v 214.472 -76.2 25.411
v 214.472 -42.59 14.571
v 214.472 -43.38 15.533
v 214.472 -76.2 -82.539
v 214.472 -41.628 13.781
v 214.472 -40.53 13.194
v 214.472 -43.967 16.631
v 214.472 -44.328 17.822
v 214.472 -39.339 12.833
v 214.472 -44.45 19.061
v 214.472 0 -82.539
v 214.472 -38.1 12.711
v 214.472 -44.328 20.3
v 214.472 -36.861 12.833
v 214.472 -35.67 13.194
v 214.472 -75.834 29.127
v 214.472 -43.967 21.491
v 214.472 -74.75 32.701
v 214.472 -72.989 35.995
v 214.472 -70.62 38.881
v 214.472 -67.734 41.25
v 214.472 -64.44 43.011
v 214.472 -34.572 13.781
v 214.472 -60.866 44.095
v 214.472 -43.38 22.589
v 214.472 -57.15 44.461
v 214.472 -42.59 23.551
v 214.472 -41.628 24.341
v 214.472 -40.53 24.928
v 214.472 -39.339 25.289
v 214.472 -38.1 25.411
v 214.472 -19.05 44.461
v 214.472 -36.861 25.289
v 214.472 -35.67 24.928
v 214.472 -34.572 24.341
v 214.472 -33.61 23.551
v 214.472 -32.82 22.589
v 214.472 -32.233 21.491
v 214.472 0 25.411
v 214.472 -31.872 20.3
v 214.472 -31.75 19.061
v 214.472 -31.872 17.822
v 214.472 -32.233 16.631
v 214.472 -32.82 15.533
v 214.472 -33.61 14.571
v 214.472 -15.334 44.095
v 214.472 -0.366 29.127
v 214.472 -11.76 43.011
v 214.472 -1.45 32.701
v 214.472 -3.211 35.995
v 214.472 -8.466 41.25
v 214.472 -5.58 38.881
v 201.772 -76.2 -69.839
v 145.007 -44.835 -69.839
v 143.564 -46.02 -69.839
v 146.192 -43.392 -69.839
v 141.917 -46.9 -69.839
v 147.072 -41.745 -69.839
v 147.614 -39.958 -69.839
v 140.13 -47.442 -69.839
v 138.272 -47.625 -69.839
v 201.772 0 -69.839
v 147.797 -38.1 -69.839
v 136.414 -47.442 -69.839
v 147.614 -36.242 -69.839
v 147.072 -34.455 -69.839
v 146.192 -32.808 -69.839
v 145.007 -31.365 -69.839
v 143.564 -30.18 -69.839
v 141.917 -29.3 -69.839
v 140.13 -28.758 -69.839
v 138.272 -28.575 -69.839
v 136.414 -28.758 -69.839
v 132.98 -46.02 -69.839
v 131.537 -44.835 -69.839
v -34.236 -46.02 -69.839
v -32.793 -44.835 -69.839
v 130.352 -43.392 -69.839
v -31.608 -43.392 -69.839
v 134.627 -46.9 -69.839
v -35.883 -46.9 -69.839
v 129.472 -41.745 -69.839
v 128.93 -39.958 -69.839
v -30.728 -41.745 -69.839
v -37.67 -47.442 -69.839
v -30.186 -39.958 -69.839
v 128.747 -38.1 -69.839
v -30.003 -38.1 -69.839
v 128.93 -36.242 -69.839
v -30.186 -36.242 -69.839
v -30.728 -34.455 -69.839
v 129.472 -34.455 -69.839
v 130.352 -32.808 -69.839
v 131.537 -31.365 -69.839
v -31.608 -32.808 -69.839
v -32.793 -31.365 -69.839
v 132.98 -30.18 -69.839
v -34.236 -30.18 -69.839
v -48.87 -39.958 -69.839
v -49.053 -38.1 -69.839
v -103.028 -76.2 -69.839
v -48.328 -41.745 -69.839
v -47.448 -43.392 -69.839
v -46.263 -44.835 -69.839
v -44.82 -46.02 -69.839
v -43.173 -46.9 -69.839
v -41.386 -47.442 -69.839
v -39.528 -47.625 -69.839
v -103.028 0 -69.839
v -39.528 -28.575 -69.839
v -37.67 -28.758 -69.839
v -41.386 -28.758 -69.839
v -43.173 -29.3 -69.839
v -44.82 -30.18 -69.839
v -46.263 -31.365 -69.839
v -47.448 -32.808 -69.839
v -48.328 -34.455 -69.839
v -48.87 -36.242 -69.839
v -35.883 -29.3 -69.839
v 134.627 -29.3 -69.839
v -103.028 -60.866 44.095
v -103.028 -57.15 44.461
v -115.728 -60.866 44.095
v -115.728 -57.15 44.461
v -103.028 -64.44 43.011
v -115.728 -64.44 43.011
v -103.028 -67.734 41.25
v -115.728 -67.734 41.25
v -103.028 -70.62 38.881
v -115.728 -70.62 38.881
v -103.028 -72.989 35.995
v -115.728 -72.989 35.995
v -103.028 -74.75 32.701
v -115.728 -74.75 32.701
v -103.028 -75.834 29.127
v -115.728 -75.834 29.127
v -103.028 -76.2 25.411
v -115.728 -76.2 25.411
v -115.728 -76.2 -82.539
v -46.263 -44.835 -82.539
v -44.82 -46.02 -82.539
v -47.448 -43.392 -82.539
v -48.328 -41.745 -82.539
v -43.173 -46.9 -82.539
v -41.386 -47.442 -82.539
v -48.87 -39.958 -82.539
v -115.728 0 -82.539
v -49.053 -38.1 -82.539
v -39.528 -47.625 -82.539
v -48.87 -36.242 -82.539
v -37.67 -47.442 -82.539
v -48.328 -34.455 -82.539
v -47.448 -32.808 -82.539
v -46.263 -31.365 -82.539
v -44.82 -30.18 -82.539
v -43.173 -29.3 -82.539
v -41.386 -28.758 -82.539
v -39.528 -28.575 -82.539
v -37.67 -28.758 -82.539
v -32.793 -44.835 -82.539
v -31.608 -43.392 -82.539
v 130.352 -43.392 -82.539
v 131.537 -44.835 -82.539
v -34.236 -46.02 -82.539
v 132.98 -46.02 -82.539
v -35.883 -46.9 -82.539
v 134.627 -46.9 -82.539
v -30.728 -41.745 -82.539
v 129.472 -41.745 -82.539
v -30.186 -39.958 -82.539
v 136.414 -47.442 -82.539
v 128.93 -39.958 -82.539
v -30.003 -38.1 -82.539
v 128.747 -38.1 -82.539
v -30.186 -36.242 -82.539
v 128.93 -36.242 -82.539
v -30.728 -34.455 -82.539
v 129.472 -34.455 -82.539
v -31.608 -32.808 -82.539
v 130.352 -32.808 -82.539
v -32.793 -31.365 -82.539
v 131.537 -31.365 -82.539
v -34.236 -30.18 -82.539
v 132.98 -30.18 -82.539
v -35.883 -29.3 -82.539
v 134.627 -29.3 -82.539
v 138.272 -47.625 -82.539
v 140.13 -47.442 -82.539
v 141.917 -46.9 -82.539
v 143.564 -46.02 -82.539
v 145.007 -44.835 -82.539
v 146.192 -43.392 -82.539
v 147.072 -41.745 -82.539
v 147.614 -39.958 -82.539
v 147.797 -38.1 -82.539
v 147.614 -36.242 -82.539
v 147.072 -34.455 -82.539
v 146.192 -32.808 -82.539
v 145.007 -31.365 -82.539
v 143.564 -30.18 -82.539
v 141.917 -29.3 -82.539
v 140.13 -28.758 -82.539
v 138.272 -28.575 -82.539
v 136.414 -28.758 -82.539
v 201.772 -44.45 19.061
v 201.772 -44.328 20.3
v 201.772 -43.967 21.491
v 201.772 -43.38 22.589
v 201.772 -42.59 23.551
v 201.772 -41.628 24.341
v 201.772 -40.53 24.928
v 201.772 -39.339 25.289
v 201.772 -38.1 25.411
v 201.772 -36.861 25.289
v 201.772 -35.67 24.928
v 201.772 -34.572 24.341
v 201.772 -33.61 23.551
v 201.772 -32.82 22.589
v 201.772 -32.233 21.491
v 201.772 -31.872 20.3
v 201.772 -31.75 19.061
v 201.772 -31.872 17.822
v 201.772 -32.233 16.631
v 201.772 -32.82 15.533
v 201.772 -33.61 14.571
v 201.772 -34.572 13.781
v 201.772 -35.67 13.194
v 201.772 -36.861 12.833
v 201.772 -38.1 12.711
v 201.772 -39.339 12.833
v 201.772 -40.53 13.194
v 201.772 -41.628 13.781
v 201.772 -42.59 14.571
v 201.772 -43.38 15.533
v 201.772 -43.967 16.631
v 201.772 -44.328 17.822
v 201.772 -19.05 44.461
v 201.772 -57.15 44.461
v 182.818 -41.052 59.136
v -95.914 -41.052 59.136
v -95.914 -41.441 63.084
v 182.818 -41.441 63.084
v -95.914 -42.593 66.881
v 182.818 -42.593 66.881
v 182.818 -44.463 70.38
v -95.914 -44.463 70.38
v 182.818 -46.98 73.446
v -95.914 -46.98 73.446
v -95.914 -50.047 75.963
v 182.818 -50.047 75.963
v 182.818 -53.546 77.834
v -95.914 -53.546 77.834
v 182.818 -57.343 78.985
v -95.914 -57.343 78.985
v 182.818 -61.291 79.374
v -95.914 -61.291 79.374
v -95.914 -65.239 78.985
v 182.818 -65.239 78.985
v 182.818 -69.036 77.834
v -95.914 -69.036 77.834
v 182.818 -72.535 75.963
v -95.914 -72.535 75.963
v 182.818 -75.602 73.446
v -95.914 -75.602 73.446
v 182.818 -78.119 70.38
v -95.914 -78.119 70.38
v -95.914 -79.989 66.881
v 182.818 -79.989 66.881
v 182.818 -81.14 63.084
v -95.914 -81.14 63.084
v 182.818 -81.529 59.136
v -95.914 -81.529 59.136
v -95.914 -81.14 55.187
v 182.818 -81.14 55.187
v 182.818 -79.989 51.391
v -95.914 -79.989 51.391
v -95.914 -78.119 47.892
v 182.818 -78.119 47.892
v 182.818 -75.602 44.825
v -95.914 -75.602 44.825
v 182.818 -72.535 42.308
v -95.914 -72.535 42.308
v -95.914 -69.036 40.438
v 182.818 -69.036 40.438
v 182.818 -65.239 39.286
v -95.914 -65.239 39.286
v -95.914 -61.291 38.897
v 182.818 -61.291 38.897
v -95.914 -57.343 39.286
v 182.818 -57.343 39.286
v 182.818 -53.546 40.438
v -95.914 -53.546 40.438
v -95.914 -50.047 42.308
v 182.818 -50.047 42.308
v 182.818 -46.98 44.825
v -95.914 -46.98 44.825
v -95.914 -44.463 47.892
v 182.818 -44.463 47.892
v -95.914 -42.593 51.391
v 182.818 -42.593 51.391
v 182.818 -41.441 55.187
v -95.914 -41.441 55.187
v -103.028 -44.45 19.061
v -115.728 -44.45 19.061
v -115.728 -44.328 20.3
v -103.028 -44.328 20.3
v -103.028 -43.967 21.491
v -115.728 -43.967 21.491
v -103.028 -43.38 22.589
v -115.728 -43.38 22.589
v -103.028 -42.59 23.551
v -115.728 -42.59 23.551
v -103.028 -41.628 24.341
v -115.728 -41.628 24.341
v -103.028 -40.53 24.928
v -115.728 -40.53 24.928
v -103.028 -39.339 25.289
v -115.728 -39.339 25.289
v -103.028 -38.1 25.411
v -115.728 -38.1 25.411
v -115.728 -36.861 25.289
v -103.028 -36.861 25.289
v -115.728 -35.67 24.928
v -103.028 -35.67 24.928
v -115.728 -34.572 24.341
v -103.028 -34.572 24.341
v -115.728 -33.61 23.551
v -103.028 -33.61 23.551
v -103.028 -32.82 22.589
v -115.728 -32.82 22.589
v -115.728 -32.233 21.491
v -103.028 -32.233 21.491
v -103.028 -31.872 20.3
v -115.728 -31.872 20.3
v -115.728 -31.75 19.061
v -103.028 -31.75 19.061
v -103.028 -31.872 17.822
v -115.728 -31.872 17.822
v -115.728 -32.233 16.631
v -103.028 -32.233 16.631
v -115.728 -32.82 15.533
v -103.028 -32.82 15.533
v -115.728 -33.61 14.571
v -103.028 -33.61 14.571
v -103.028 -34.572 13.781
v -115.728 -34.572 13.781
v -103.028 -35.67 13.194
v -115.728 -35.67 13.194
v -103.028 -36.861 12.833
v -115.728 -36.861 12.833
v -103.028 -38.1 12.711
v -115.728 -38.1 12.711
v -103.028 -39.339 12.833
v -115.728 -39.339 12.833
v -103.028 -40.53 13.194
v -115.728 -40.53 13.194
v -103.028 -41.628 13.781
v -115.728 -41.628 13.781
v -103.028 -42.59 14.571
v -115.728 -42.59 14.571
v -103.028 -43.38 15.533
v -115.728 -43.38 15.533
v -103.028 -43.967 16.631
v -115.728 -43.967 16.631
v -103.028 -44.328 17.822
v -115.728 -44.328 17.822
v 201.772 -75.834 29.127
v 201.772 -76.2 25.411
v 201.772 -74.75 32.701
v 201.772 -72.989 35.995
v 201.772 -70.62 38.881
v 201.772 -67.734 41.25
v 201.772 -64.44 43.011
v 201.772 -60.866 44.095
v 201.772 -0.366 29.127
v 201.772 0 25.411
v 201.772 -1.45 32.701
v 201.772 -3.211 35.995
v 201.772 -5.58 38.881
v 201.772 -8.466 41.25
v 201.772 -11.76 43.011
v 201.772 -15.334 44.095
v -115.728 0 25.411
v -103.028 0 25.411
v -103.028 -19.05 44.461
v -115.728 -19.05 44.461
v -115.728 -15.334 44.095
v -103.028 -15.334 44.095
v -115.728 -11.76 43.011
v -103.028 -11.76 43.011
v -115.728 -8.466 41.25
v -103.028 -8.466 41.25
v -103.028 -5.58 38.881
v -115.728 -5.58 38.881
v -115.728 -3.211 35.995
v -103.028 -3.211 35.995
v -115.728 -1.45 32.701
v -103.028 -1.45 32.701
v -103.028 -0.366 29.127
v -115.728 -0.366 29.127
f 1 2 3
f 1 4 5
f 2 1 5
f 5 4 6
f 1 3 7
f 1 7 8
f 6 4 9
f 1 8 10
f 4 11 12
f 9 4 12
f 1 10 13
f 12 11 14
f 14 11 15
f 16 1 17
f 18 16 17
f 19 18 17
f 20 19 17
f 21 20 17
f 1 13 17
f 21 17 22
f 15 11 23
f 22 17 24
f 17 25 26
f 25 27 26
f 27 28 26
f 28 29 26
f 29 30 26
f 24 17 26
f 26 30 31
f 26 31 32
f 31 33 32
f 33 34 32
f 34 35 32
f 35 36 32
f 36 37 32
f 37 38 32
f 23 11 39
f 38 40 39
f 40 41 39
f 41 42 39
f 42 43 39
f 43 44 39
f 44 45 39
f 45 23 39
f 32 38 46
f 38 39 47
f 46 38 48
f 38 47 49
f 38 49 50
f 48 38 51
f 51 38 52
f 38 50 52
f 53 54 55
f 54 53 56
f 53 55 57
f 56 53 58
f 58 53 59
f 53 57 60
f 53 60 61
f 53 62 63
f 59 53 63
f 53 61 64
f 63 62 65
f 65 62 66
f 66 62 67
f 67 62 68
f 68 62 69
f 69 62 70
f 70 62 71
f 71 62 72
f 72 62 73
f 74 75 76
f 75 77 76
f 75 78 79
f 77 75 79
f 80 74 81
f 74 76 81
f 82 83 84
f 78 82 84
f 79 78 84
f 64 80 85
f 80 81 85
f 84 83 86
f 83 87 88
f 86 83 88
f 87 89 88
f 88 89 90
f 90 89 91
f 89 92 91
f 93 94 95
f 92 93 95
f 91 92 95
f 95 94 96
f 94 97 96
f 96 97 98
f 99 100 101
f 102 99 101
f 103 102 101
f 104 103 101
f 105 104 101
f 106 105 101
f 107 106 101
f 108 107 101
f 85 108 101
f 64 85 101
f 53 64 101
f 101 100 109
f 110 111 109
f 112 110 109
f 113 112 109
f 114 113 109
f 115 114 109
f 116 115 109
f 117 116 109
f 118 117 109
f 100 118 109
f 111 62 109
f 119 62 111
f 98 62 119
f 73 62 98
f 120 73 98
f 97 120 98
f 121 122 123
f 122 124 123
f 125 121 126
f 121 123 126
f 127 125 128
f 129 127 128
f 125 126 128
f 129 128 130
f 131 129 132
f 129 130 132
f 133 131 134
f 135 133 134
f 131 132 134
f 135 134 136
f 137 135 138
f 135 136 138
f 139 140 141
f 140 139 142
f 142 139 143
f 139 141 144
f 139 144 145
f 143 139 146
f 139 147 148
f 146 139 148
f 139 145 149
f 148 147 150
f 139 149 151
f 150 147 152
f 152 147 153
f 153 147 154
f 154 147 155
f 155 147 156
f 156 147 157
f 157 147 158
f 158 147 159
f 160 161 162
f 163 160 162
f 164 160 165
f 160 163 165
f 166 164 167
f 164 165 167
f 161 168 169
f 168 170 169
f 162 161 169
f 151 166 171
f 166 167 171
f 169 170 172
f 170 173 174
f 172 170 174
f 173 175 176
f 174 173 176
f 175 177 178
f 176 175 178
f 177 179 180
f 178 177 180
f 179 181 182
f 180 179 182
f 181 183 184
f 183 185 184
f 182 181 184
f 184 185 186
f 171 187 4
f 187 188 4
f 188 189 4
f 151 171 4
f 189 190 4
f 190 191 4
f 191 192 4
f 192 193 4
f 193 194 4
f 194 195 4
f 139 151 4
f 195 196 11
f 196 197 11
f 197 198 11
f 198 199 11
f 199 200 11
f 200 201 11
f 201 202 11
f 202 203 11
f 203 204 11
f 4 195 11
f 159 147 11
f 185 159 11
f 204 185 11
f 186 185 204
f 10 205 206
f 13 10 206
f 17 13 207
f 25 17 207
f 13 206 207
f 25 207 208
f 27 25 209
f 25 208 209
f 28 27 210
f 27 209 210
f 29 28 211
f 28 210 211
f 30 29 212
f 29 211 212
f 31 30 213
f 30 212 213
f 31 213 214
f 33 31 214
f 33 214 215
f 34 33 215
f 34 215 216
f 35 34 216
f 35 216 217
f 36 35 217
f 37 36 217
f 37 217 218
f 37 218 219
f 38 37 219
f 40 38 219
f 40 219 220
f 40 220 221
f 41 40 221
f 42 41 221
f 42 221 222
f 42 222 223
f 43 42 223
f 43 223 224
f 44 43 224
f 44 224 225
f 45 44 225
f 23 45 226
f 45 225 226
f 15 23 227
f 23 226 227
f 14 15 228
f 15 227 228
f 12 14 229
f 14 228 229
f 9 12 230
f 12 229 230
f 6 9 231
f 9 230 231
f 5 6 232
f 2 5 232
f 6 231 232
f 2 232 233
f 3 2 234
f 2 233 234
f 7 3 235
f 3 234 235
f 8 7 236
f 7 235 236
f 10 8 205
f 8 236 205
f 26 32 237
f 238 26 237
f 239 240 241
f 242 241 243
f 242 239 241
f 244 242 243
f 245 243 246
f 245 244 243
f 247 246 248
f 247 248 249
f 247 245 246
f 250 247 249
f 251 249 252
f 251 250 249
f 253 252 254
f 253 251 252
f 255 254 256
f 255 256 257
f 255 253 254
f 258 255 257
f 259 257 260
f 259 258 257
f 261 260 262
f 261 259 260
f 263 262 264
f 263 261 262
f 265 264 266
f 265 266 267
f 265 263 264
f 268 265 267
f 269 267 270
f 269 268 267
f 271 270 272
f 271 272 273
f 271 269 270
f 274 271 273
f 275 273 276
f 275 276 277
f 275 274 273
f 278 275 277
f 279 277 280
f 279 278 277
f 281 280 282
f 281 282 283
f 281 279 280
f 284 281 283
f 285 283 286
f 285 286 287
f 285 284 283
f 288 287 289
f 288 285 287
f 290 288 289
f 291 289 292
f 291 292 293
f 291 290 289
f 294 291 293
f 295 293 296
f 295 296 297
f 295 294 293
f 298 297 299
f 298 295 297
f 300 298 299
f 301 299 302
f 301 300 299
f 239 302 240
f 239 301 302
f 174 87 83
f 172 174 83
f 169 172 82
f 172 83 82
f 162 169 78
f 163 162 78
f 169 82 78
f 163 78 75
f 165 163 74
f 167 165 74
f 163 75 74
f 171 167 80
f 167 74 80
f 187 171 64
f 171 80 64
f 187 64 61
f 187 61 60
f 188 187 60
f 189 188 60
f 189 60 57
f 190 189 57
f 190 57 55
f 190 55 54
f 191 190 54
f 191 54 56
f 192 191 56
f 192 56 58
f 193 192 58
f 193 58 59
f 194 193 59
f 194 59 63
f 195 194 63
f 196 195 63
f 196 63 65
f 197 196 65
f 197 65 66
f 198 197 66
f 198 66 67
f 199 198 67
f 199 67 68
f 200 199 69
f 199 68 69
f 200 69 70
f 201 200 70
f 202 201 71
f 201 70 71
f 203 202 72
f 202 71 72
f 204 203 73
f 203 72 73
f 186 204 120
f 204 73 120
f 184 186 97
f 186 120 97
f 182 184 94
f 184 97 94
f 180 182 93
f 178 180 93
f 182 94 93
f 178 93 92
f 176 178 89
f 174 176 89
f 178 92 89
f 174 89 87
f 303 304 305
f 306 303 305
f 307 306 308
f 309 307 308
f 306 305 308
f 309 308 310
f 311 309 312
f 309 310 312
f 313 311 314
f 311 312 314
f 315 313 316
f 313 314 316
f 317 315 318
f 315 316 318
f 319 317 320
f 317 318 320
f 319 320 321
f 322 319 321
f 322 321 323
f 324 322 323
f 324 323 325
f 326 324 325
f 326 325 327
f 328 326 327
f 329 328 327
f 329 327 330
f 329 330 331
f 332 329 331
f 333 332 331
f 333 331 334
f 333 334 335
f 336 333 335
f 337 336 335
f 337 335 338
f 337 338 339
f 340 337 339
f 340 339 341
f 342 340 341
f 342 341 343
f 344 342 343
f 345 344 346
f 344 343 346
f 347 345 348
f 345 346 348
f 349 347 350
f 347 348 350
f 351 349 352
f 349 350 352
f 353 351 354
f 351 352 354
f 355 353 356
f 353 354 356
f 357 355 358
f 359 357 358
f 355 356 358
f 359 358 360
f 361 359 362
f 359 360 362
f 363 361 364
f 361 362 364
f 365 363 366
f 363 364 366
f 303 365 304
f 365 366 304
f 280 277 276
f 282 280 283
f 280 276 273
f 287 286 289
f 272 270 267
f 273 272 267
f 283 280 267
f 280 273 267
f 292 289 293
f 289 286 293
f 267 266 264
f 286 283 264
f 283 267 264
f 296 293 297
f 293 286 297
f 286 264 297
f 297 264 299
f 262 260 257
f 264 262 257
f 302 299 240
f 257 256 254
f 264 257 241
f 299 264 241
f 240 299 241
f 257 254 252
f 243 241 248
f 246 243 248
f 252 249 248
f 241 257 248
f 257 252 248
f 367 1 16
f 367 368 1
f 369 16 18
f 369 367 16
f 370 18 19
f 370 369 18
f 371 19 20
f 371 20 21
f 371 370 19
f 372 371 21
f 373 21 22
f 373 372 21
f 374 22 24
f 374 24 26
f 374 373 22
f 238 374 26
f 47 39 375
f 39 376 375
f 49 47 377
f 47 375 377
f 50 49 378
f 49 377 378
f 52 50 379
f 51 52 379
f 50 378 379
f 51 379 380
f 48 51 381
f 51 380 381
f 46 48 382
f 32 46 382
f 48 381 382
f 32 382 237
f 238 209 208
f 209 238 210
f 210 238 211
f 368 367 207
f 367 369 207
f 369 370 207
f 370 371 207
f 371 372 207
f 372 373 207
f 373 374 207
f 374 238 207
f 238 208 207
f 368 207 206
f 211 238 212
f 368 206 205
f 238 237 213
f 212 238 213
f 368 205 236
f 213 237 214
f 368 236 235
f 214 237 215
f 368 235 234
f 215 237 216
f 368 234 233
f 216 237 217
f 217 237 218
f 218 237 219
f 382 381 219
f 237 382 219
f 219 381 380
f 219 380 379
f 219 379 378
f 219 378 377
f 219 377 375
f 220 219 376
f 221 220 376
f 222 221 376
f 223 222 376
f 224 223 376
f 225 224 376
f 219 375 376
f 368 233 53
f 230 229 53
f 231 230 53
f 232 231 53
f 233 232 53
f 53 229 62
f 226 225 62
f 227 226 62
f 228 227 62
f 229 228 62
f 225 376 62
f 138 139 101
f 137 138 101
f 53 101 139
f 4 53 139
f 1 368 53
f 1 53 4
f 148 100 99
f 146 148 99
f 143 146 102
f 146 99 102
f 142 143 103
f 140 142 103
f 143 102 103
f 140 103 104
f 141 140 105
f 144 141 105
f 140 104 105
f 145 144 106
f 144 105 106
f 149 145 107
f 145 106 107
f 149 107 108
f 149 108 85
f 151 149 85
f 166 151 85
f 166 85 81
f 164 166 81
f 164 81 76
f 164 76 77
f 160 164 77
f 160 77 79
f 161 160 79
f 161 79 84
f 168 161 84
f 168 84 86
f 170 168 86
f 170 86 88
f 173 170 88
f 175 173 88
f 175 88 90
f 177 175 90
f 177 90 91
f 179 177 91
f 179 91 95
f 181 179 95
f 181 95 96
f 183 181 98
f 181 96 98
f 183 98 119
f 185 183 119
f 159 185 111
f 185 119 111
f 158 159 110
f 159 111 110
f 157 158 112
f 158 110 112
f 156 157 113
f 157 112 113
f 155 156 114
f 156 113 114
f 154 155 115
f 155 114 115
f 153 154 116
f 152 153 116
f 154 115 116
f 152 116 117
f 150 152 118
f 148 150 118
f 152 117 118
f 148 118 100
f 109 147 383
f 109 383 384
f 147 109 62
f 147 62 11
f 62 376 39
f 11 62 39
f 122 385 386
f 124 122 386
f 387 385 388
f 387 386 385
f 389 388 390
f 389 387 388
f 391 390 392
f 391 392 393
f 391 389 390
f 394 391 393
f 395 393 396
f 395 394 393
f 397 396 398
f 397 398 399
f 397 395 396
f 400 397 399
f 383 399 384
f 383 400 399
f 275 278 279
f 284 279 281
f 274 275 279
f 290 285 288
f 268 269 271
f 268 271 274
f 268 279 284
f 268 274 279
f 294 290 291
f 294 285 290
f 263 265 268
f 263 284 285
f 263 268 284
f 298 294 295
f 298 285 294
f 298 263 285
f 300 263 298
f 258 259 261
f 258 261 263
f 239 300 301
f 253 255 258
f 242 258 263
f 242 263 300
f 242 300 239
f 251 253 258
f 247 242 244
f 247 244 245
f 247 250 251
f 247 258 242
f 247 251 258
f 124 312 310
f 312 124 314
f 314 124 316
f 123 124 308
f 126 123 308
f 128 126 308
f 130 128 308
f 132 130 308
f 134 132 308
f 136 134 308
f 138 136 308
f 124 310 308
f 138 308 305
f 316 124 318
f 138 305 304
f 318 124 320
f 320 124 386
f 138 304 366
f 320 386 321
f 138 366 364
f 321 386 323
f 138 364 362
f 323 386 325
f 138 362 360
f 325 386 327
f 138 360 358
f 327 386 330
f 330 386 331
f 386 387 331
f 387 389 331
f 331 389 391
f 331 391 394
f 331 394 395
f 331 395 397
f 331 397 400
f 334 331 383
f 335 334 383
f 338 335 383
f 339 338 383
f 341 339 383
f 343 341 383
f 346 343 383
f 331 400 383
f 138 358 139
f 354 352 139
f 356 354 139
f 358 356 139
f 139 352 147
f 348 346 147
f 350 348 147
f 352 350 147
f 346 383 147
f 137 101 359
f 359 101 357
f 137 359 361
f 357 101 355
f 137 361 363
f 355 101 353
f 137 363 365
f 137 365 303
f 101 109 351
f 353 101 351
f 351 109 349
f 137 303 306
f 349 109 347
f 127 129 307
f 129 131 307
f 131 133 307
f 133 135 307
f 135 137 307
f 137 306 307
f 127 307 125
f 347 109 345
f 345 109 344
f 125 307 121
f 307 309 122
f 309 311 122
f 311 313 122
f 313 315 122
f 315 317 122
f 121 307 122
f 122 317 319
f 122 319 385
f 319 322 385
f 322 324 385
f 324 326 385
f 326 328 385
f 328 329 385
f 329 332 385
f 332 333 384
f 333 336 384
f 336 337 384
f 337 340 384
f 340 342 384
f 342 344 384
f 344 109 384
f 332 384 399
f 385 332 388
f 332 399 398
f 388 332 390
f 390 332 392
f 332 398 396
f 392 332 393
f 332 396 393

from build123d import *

# Parameters (mm, degrees)
F1_DEPTH      = 76.2
F3_D          = 12.7
F4_R          = 19.05
F6_D          = 19.05
F7_R          = 20.238474
F8_DEPTH      = 182.8178
F8_DEPTH_BACK = 95.9143


with BuildPart() as f1:
    # F0 (on Front) → F1 (new body)
    with BuildSketch(Plane.XZ):
        Polygon((-103.028067, 44.460986), (-115.728067, 44.460986), (-115.728067, -82.539014), (214.471933, -82.539014), (214.471933, 44.460986), (201.771933, 44.460986), (201.771933, -69.839014), (-103.028067, -69.839014), align=None)
    extrude(amount=F1_DEPTH)

    # F3 (through all)
    with Locations(Plane.YZ.offset(214.471933)):
        with Locations((-38.1, 19.060986)):
            Hole(F3_D / 2)

    # F4
    f4_edges = [f1.edges().sort_by_distance(p)[0] for p in [
        (208.121933, -76.2, 44.460986),
        (208.121933, 0, 44.460986),
        (-109.378067, -76.2, 44.460986),
        (-109.378067, 0, 44.460986),
    ]]
    fillet(f4_edges, radius=F4_R)

    # F6 (through all)
    with Locations(Plane(origin=(0, 0, -82.539014), x_dir=(1, 0, 0), z_dir=(0, 0, -1))):
        with Locations((-39.528067, 38.1), (138.271933, 38.1)):
            Hole(F6_D / 2)


with BuildPart() as f8:
    # F7 (on Right) → F8 (new body, two sides)
    with BuildSketch(Plane.YZ) as f8_sk:
        with Locations((-61.290886, 59.135672)):
            Circle(F7_R)
    extrude(amount=F8_DEPTH)
    extrude(f8_sk.sketch, amount=-F8_DEPTH_BACK)


solid = Compound([f1.part, f8.part])
